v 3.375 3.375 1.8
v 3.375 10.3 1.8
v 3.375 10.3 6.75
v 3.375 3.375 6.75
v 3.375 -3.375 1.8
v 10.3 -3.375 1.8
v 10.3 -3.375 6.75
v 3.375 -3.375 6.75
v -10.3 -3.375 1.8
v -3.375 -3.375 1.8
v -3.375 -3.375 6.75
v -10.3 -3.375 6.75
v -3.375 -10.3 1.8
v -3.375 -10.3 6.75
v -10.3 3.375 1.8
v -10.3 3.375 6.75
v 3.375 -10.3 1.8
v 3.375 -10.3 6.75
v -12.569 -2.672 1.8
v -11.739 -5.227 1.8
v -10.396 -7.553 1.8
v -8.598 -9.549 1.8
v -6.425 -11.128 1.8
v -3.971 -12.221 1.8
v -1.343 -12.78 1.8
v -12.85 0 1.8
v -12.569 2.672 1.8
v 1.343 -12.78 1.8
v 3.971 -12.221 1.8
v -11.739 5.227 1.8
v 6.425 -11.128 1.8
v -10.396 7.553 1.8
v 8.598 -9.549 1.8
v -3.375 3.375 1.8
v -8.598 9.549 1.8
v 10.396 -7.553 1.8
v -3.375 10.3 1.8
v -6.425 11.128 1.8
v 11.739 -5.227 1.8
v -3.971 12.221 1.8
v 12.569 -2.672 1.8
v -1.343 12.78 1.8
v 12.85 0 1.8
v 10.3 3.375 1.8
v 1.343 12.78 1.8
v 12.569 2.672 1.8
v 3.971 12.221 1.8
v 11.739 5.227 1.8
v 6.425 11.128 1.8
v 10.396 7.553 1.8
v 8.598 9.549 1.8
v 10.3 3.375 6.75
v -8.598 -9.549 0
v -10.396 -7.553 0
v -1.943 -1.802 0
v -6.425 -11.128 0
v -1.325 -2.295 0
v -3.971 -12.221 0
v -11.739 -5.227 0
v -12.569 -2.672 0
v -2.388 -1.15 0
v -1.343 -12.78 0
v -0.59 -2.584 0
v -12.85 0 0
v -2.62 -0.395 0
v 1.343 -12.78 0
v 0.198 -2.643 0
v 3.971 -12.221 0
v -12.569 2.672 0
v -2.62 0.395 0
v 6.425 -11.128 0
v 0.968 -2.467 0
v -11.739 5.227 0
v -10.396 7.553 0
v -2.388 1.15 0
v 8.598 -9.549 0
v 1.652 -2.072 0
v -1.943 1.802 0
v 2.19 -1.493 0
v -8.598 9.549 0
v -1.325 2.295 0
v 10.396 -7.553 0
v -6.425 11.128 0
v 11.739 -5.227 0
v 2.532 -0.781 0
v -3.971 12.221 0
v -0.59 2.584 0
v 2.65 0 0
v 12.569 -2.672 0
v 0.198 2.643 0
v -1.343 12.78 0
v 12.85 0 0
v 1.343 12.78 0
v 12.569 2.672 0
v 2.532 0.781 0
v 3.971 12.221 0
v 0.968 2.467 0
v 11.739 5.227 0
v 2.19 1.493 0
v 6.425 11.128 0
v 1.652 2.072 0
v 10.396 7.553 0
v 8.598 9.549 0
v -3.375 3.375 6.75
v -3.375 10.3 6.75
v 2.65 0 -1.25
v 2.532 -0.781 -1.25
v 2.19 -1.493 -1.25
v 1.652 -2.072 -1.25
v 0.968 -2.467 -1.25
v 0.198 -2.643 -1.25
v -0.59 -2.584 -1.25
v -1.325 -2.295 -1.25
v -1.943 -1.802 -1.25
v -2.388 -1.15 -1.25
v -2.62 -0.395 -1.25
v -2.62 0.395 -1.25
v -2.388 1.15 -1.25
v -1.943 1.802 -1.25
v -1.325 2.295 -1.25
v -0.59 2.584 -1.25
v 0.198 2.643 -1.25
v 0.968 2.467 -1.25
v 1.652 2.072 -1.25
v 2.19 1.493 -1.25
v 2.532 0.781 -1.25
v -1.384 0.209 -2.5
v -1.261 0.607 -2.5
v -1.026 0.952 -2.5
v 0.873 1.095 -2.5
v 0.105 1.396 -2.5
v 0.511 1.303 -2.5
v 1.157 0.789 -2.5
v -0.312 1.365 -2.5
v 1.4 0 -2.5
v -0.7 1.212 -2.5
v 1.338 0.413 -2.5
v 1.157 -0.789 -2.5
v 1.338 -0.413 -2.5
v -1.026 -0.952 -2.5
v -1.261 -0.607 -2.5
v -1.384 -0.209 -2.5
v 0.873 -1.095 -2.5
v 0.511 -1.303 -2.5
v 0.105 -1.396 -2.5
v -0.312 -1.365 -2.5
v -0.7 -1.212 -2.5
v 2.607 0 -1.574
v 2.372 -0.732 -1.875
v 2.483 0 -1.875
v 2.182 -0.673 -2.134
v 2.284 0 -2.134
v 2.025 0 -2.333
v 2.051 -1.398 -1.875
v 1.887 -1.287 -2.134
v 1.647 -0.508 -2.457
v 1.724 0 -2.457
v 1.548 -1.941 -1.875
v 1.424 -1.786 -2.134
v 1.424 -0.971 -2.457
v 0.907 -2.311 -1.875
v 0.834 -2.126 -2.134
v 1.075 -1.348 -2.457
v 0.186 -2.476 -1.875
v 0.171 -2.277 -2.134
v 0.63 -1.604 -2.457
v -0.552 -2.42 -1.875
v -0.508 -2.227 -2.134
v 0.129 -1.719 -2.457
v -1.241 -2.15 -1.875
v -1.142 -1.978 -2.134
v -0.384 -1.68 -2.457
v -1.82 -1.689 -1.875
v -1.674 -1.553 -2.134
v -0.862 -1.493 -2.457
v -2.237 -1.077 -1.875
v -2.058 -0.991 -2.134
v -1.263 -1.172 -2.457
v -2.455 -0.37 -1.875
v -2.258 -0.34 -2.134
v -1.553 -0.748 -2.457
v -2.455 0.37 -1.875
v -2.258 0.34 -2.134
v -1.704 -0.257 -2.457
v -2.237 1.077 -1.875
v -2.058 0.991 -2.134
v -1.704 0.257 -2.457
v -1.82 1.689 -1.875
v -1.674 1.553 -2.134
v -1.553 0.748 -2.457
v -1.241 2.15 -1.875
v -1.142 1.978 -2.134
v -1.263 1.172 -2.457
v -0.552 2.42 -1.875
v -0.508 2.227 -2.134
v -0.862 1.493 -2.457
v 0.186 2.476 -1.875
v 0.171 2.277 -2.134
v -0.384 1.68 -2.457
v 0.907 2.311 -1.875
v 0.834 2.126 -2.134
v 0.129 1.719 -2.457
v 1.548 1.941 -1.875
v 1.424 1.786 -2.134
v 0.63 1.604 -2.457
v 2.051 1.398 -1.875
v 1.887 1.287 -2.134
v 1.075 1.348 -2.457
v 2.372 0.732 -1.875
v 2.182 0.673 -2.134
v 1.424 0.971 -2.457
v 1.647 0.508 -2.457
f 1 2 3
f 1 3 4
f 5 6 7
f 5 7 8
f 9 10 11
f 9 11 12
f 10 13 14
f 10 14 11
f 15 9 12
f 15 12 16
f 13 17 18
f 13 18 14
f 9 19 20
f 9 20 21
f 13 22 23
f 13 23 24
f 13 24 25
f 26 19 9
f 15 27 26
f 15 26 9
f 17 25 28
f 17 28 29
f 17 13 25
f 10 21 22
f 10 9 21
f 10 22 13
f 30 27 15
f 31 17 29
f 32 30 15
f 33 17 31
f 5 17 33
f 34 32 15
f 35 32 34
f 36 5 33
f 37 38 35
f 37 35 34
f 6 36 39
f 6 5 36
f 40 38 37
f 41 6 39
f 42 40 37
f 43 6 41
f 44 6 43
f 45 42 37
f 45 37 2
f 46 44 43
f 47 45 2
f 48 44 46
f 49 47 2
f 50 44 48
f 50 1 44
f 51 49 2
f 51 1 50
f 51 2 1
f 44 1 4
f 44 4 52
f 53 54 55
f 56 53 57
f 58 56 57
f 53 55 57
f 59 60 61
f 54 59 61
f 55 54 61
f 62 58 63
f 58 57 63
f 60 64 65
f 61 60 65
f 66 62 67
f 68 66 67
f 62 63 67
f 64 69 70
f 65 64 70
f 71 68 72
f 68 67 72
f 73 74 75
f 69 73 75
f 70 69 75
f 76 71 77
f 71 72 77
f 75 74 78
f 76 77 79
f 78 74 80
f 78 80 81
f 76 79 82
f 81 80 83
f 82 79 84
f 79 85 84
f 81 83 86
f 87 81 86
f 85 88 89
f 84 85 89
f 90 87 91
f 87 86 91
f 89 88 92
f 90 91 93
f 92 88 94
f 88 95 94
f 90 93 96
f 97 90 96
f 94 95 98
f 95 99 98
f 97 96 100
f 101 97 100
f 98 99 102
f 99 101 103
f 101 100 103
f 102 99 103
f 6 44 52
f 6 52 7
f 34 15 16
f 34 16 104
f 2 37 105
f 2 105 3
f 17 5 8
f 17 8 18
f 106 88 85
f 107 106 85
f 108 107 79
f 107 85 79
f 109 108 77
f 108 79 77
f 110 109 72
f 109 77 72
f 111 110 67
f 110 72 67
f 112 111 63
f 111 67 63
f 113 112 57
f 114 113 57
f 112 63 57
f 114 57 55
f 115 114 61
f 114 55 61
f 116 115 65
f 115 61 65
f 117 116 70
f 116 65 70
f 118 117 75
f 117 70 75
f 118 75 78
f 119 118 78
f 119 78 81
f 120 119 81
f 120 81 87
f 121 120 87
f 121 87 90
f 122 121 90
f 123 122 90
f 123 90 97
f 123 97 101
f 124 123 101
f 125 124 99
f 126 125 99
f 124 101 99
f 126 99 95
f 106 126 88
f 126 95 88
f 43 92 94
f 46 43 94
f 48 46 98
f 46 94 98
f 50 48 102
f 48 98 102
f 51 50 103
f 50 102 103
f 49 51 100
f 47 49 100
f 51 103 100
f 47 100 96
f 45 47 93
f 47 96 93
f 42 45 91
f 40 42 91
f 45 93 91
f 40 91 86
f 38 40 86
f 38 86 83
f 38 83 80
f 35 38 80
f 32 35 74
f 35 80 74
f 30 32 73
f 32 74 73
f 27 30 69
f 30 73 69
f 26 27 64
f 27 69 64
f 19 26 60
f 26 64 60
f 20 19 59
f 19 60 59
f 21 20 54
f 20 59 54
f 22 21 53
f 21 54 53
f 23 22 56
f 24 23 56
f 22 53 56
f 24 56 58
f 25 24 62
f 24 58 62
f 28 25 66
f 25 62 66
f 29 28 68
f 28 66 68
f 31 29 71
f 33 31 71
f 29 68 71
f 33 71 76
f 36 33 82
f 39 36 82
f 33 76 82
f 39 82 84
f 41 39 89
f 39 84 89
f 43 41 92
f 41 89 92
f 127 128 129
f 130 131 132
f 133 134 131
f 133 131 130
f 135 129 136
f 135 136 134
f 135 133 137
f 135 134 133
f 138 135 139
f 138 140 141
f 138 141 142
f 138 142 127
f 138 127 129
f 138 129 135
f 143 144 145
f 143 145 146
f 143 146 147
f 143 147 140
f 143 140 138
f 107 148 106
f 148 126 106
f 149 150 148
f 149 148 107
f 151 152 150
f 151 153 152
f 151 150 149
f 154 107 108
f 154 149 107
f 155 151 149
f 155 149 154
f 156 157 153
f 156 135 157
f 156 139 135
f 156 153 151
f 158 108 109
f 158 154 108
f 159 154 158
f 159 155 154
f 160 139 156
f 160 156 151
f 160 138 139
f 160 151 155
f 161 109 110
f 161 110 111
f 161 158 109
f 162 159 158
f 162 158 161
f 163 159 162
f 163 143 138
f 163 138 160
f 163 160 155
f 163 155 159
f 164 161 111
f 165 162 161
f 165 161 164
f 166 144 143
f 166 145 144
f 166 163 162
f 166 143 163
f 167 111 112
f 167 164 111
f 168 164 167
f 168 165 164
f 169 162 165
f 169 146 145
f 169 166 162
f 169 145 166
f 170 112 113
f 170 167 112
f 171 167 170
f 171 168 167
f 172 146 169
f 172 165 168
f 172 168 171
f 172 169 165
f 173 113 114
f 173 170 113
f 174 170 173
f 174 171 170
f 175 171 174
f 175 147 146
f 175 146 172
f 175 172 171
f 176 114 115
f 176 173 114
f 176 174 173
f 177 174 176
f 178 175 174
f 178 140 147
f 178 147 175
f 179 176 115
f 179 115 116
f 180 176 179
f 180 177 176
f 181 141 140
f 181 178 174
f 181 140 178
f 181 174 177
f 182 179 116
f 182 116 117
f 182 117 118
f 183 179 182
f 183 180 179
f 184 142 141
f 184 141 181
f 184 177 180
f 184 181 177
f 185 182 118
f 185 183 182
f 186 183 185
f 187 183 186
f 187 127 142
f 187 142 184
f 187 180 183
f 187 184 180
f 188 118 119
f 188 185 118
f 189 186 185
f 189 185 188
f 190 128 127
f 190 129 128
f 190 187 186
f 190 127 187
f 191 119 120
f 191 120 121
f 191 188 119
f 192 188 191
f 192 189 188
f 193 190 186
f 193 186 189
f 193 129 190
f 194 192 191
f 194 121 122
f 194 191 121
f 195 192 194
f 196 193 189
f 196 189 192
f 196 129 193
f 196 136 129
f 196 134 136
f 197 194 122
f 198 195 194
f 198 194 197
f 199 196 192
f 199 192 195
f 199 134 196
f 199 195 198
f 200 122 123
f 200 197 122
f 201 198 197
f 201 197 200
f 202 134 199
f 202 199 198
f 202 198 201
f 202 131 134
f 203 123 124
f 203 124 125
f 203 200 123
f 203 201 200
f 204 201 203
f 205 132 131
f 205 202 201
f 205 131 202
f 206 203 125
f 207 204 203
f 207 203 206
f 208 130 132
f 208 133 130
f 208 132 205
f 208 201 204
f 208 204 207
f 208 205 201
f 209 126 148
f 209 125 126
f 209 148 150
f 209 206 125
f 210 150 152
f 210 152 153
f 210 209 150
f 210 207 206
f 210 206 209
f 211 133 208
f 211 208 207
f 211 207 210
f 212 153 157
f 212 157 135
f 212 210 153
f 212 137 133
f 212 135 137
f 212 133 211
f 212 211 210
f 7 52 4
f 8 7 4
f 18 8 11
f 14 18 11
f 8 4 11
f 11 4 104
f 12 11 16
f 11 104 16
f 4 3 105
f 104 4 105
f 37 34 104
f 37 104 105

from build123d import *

# Parameters (mm, degrees)
SKETCH1_R           = 12.85
BOSS_EXTRUDE1_DEPTH = 1.8
BOSS_EXTRUDE2_DEPTH = 4.95
SKETCH3_R           = 2.65
BOSS_EXTRUDE3_DEPTH = 2.5
FILLET1_R           = 1.25


with BuildPart() as part:
    # Sketch1 → Boss-Extrude1 (new body)
    with BuildSketch(Plane.XY):
        Circle(SKETCH1_R)
    extrude(amount=BOSS_EXTRUDE1_DEPTH)

    # Sketch2 → Boss-Extrude2 (add)
    with BuildSketch(Plane.XY.offset(1.8)):
        Polygon((3.375, 3.375), (10.3, 3.375), (10.3, -3.375), (3.375, -3.375), (3.375, -10.3), (-3.375, -10.3), (-3.375, -3.375), (-10.3, -3.375), (-10.3, 3.375), (-3.375, 3.375), (-3.375, 10.3), (3.375, 10.3), align=None)
    extrude(amount=BOSS_EXTRUDE2_DEPTH)

    # Sketch3 → Boss-Extrude3 (add)
    with BuildSketch(Plane(origin=(0, 0, 0), x_dir=(-1, 0, 0), z_dir=(0, 0, -1))):
        with Locations(Location((0, 0, 0), (0, 0, 180))):
            Circle(SKETCH3_R)
    extrude(amount=BOSS_EXTRUDE3_DEPTH)

    # Fillet1
    fillet1_edges = [part.edges().sort_by_distance(p)[0] for p in [
        (-2.65, 0, -2.5),
    ]]
    fillet(fillet1_edges, radius=FILLET1_R)


solid = part.part
